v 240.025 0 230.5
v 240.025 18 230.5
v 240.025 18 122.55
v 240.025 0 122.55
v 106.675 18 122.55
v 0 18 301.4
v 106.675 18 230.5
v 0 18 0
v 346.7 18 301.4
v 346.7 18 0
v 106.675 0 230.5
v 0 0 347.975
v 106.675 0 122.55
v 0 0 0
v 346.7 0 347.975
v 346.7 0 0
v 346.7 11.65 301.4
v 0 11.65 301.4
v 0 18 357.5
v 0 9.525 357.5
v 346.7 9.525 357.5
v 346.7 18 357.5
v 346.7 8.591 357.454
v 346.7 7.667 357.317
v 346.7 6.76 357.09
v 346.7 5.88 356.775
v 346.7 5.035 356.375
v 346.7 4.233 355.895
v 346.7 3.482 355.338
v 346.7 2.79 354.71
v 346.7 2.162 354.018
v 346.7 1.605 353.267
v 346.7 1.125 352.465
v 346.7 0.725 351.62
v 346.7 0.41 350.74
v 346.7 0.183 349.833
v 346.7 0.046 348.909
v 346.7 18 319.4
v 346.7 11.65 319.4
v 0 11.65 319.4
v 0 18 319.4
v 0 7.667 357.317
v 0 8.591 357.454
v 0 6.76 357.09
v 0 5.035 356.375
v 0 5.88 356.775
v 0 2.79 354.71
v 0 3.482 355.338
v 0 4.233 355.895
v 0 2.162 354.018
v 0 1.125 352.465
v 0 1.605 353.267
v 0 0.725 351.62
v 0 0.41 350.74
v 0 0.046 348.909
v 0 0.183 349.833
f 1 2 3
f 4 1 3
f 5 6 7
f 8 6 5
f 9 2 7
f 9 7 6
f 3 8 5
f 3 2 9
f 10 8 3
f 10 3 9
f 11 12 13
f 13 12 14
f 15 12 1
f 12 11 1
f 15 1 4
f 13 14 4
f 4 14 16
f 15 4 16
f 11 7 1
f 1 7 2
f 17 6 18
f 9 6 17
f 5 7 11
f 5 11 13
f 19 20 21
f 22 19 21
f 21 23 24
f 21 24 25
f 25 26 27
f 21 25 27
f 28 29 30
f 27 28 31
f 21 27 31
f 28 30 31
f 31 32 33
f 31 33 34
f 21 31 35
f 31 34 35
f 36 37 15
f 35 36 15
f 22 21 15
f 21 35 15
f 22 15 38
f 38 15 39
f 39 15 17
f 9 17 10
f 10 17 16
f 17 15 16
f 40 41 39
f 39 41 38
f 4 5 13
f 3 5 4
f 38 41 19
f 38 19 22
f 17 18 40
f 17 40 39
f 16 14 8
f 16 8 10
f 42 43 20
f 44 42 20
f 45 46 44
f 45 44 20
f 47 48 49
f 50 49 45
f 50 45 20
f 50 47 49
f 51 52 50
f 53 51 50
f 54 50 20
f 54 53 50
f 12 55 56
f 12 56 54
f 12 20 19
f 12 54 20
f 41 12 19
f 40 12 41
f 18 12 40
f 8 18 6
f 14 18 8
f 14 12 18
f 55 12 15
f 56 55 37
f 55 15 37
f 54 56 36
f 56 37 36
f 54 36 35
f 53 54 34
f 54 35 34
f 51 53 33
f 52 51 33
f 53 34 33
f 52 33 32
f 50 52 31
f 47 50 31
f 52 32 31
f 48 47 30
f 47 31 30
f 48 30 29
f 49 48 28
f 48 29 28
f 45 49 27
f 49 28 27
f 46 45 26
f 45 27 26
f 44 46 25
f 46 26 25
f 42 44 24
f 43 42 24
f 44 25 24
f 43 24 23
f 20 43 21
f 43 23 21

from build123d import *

# Parameters (mm, degrees)
SKETCH1_W           = 346.7
SKETCH1_H           = 357.50000001
BOSS_EXTRUDE1_DEPTH = 18
SKETCH2_W           = 346.7
SKETCH2_H           = 18
CUT_EXTRUDE1_DEPTH  = 6.35
SKETCH3_W           = 133.35
SKETCH3_H           = 107.95
CUT_EXTRUDE3_DEPTH  = 19
FILLET1_R           = 9.525


with BuildPart() as part:
    # Sketch1 → Boss-Extrude1 (new body)
    with BuildSketch(Plane(origin=(0, 0, 0), x_dir=(1, 0, 0), z_dir=(0, 1, 0))):
        with Locations((173.35, -178.750000005)):
            Rectangle(SKETCH1_W, SKETCH1_H)
    extrude(amount=BOSS_EXTRUDE1_DEPTH)

    # Sketch2 → Cut-Extrude1 (cut)
    with BuildSketch(Plane(origin=(0, 18, 0), x_dir=(1, 0, 0), z_dir=(0, 1, 0))):
        with Locations((173.35, -310.40000001)):
            Rectangle(SKETCH2_W, SKETCH2_H)
    extrude(amount=-CUT_EXTRUDE1_DEPTH, mode=Mode.SUBTRACT)

    # Sketch3 → Cut-Extrude3 (cut, through all)
    with BuildSketch(Plane(origin=(0, 18, 0), x_dir=(1, 0, 0), z_dir=(0, 1, 0))):
        with Locations((173.35, -176.52500001)):
            Rectangle(SKETCH3_W, SKETCH3_H)
    extrude(amount=-CUT_EXTRUDE3_DEPTH, mode=Mode.SUBTRACT)

    # Fillet1
    fillet1_edges = [part.edges().sort_by_distance(p)[0] for p in [
        (173.35, 0, 357.50000001),
    ]]
    fillet(fillet1_edges, radius=FILLET1_R)


solid = part.part
